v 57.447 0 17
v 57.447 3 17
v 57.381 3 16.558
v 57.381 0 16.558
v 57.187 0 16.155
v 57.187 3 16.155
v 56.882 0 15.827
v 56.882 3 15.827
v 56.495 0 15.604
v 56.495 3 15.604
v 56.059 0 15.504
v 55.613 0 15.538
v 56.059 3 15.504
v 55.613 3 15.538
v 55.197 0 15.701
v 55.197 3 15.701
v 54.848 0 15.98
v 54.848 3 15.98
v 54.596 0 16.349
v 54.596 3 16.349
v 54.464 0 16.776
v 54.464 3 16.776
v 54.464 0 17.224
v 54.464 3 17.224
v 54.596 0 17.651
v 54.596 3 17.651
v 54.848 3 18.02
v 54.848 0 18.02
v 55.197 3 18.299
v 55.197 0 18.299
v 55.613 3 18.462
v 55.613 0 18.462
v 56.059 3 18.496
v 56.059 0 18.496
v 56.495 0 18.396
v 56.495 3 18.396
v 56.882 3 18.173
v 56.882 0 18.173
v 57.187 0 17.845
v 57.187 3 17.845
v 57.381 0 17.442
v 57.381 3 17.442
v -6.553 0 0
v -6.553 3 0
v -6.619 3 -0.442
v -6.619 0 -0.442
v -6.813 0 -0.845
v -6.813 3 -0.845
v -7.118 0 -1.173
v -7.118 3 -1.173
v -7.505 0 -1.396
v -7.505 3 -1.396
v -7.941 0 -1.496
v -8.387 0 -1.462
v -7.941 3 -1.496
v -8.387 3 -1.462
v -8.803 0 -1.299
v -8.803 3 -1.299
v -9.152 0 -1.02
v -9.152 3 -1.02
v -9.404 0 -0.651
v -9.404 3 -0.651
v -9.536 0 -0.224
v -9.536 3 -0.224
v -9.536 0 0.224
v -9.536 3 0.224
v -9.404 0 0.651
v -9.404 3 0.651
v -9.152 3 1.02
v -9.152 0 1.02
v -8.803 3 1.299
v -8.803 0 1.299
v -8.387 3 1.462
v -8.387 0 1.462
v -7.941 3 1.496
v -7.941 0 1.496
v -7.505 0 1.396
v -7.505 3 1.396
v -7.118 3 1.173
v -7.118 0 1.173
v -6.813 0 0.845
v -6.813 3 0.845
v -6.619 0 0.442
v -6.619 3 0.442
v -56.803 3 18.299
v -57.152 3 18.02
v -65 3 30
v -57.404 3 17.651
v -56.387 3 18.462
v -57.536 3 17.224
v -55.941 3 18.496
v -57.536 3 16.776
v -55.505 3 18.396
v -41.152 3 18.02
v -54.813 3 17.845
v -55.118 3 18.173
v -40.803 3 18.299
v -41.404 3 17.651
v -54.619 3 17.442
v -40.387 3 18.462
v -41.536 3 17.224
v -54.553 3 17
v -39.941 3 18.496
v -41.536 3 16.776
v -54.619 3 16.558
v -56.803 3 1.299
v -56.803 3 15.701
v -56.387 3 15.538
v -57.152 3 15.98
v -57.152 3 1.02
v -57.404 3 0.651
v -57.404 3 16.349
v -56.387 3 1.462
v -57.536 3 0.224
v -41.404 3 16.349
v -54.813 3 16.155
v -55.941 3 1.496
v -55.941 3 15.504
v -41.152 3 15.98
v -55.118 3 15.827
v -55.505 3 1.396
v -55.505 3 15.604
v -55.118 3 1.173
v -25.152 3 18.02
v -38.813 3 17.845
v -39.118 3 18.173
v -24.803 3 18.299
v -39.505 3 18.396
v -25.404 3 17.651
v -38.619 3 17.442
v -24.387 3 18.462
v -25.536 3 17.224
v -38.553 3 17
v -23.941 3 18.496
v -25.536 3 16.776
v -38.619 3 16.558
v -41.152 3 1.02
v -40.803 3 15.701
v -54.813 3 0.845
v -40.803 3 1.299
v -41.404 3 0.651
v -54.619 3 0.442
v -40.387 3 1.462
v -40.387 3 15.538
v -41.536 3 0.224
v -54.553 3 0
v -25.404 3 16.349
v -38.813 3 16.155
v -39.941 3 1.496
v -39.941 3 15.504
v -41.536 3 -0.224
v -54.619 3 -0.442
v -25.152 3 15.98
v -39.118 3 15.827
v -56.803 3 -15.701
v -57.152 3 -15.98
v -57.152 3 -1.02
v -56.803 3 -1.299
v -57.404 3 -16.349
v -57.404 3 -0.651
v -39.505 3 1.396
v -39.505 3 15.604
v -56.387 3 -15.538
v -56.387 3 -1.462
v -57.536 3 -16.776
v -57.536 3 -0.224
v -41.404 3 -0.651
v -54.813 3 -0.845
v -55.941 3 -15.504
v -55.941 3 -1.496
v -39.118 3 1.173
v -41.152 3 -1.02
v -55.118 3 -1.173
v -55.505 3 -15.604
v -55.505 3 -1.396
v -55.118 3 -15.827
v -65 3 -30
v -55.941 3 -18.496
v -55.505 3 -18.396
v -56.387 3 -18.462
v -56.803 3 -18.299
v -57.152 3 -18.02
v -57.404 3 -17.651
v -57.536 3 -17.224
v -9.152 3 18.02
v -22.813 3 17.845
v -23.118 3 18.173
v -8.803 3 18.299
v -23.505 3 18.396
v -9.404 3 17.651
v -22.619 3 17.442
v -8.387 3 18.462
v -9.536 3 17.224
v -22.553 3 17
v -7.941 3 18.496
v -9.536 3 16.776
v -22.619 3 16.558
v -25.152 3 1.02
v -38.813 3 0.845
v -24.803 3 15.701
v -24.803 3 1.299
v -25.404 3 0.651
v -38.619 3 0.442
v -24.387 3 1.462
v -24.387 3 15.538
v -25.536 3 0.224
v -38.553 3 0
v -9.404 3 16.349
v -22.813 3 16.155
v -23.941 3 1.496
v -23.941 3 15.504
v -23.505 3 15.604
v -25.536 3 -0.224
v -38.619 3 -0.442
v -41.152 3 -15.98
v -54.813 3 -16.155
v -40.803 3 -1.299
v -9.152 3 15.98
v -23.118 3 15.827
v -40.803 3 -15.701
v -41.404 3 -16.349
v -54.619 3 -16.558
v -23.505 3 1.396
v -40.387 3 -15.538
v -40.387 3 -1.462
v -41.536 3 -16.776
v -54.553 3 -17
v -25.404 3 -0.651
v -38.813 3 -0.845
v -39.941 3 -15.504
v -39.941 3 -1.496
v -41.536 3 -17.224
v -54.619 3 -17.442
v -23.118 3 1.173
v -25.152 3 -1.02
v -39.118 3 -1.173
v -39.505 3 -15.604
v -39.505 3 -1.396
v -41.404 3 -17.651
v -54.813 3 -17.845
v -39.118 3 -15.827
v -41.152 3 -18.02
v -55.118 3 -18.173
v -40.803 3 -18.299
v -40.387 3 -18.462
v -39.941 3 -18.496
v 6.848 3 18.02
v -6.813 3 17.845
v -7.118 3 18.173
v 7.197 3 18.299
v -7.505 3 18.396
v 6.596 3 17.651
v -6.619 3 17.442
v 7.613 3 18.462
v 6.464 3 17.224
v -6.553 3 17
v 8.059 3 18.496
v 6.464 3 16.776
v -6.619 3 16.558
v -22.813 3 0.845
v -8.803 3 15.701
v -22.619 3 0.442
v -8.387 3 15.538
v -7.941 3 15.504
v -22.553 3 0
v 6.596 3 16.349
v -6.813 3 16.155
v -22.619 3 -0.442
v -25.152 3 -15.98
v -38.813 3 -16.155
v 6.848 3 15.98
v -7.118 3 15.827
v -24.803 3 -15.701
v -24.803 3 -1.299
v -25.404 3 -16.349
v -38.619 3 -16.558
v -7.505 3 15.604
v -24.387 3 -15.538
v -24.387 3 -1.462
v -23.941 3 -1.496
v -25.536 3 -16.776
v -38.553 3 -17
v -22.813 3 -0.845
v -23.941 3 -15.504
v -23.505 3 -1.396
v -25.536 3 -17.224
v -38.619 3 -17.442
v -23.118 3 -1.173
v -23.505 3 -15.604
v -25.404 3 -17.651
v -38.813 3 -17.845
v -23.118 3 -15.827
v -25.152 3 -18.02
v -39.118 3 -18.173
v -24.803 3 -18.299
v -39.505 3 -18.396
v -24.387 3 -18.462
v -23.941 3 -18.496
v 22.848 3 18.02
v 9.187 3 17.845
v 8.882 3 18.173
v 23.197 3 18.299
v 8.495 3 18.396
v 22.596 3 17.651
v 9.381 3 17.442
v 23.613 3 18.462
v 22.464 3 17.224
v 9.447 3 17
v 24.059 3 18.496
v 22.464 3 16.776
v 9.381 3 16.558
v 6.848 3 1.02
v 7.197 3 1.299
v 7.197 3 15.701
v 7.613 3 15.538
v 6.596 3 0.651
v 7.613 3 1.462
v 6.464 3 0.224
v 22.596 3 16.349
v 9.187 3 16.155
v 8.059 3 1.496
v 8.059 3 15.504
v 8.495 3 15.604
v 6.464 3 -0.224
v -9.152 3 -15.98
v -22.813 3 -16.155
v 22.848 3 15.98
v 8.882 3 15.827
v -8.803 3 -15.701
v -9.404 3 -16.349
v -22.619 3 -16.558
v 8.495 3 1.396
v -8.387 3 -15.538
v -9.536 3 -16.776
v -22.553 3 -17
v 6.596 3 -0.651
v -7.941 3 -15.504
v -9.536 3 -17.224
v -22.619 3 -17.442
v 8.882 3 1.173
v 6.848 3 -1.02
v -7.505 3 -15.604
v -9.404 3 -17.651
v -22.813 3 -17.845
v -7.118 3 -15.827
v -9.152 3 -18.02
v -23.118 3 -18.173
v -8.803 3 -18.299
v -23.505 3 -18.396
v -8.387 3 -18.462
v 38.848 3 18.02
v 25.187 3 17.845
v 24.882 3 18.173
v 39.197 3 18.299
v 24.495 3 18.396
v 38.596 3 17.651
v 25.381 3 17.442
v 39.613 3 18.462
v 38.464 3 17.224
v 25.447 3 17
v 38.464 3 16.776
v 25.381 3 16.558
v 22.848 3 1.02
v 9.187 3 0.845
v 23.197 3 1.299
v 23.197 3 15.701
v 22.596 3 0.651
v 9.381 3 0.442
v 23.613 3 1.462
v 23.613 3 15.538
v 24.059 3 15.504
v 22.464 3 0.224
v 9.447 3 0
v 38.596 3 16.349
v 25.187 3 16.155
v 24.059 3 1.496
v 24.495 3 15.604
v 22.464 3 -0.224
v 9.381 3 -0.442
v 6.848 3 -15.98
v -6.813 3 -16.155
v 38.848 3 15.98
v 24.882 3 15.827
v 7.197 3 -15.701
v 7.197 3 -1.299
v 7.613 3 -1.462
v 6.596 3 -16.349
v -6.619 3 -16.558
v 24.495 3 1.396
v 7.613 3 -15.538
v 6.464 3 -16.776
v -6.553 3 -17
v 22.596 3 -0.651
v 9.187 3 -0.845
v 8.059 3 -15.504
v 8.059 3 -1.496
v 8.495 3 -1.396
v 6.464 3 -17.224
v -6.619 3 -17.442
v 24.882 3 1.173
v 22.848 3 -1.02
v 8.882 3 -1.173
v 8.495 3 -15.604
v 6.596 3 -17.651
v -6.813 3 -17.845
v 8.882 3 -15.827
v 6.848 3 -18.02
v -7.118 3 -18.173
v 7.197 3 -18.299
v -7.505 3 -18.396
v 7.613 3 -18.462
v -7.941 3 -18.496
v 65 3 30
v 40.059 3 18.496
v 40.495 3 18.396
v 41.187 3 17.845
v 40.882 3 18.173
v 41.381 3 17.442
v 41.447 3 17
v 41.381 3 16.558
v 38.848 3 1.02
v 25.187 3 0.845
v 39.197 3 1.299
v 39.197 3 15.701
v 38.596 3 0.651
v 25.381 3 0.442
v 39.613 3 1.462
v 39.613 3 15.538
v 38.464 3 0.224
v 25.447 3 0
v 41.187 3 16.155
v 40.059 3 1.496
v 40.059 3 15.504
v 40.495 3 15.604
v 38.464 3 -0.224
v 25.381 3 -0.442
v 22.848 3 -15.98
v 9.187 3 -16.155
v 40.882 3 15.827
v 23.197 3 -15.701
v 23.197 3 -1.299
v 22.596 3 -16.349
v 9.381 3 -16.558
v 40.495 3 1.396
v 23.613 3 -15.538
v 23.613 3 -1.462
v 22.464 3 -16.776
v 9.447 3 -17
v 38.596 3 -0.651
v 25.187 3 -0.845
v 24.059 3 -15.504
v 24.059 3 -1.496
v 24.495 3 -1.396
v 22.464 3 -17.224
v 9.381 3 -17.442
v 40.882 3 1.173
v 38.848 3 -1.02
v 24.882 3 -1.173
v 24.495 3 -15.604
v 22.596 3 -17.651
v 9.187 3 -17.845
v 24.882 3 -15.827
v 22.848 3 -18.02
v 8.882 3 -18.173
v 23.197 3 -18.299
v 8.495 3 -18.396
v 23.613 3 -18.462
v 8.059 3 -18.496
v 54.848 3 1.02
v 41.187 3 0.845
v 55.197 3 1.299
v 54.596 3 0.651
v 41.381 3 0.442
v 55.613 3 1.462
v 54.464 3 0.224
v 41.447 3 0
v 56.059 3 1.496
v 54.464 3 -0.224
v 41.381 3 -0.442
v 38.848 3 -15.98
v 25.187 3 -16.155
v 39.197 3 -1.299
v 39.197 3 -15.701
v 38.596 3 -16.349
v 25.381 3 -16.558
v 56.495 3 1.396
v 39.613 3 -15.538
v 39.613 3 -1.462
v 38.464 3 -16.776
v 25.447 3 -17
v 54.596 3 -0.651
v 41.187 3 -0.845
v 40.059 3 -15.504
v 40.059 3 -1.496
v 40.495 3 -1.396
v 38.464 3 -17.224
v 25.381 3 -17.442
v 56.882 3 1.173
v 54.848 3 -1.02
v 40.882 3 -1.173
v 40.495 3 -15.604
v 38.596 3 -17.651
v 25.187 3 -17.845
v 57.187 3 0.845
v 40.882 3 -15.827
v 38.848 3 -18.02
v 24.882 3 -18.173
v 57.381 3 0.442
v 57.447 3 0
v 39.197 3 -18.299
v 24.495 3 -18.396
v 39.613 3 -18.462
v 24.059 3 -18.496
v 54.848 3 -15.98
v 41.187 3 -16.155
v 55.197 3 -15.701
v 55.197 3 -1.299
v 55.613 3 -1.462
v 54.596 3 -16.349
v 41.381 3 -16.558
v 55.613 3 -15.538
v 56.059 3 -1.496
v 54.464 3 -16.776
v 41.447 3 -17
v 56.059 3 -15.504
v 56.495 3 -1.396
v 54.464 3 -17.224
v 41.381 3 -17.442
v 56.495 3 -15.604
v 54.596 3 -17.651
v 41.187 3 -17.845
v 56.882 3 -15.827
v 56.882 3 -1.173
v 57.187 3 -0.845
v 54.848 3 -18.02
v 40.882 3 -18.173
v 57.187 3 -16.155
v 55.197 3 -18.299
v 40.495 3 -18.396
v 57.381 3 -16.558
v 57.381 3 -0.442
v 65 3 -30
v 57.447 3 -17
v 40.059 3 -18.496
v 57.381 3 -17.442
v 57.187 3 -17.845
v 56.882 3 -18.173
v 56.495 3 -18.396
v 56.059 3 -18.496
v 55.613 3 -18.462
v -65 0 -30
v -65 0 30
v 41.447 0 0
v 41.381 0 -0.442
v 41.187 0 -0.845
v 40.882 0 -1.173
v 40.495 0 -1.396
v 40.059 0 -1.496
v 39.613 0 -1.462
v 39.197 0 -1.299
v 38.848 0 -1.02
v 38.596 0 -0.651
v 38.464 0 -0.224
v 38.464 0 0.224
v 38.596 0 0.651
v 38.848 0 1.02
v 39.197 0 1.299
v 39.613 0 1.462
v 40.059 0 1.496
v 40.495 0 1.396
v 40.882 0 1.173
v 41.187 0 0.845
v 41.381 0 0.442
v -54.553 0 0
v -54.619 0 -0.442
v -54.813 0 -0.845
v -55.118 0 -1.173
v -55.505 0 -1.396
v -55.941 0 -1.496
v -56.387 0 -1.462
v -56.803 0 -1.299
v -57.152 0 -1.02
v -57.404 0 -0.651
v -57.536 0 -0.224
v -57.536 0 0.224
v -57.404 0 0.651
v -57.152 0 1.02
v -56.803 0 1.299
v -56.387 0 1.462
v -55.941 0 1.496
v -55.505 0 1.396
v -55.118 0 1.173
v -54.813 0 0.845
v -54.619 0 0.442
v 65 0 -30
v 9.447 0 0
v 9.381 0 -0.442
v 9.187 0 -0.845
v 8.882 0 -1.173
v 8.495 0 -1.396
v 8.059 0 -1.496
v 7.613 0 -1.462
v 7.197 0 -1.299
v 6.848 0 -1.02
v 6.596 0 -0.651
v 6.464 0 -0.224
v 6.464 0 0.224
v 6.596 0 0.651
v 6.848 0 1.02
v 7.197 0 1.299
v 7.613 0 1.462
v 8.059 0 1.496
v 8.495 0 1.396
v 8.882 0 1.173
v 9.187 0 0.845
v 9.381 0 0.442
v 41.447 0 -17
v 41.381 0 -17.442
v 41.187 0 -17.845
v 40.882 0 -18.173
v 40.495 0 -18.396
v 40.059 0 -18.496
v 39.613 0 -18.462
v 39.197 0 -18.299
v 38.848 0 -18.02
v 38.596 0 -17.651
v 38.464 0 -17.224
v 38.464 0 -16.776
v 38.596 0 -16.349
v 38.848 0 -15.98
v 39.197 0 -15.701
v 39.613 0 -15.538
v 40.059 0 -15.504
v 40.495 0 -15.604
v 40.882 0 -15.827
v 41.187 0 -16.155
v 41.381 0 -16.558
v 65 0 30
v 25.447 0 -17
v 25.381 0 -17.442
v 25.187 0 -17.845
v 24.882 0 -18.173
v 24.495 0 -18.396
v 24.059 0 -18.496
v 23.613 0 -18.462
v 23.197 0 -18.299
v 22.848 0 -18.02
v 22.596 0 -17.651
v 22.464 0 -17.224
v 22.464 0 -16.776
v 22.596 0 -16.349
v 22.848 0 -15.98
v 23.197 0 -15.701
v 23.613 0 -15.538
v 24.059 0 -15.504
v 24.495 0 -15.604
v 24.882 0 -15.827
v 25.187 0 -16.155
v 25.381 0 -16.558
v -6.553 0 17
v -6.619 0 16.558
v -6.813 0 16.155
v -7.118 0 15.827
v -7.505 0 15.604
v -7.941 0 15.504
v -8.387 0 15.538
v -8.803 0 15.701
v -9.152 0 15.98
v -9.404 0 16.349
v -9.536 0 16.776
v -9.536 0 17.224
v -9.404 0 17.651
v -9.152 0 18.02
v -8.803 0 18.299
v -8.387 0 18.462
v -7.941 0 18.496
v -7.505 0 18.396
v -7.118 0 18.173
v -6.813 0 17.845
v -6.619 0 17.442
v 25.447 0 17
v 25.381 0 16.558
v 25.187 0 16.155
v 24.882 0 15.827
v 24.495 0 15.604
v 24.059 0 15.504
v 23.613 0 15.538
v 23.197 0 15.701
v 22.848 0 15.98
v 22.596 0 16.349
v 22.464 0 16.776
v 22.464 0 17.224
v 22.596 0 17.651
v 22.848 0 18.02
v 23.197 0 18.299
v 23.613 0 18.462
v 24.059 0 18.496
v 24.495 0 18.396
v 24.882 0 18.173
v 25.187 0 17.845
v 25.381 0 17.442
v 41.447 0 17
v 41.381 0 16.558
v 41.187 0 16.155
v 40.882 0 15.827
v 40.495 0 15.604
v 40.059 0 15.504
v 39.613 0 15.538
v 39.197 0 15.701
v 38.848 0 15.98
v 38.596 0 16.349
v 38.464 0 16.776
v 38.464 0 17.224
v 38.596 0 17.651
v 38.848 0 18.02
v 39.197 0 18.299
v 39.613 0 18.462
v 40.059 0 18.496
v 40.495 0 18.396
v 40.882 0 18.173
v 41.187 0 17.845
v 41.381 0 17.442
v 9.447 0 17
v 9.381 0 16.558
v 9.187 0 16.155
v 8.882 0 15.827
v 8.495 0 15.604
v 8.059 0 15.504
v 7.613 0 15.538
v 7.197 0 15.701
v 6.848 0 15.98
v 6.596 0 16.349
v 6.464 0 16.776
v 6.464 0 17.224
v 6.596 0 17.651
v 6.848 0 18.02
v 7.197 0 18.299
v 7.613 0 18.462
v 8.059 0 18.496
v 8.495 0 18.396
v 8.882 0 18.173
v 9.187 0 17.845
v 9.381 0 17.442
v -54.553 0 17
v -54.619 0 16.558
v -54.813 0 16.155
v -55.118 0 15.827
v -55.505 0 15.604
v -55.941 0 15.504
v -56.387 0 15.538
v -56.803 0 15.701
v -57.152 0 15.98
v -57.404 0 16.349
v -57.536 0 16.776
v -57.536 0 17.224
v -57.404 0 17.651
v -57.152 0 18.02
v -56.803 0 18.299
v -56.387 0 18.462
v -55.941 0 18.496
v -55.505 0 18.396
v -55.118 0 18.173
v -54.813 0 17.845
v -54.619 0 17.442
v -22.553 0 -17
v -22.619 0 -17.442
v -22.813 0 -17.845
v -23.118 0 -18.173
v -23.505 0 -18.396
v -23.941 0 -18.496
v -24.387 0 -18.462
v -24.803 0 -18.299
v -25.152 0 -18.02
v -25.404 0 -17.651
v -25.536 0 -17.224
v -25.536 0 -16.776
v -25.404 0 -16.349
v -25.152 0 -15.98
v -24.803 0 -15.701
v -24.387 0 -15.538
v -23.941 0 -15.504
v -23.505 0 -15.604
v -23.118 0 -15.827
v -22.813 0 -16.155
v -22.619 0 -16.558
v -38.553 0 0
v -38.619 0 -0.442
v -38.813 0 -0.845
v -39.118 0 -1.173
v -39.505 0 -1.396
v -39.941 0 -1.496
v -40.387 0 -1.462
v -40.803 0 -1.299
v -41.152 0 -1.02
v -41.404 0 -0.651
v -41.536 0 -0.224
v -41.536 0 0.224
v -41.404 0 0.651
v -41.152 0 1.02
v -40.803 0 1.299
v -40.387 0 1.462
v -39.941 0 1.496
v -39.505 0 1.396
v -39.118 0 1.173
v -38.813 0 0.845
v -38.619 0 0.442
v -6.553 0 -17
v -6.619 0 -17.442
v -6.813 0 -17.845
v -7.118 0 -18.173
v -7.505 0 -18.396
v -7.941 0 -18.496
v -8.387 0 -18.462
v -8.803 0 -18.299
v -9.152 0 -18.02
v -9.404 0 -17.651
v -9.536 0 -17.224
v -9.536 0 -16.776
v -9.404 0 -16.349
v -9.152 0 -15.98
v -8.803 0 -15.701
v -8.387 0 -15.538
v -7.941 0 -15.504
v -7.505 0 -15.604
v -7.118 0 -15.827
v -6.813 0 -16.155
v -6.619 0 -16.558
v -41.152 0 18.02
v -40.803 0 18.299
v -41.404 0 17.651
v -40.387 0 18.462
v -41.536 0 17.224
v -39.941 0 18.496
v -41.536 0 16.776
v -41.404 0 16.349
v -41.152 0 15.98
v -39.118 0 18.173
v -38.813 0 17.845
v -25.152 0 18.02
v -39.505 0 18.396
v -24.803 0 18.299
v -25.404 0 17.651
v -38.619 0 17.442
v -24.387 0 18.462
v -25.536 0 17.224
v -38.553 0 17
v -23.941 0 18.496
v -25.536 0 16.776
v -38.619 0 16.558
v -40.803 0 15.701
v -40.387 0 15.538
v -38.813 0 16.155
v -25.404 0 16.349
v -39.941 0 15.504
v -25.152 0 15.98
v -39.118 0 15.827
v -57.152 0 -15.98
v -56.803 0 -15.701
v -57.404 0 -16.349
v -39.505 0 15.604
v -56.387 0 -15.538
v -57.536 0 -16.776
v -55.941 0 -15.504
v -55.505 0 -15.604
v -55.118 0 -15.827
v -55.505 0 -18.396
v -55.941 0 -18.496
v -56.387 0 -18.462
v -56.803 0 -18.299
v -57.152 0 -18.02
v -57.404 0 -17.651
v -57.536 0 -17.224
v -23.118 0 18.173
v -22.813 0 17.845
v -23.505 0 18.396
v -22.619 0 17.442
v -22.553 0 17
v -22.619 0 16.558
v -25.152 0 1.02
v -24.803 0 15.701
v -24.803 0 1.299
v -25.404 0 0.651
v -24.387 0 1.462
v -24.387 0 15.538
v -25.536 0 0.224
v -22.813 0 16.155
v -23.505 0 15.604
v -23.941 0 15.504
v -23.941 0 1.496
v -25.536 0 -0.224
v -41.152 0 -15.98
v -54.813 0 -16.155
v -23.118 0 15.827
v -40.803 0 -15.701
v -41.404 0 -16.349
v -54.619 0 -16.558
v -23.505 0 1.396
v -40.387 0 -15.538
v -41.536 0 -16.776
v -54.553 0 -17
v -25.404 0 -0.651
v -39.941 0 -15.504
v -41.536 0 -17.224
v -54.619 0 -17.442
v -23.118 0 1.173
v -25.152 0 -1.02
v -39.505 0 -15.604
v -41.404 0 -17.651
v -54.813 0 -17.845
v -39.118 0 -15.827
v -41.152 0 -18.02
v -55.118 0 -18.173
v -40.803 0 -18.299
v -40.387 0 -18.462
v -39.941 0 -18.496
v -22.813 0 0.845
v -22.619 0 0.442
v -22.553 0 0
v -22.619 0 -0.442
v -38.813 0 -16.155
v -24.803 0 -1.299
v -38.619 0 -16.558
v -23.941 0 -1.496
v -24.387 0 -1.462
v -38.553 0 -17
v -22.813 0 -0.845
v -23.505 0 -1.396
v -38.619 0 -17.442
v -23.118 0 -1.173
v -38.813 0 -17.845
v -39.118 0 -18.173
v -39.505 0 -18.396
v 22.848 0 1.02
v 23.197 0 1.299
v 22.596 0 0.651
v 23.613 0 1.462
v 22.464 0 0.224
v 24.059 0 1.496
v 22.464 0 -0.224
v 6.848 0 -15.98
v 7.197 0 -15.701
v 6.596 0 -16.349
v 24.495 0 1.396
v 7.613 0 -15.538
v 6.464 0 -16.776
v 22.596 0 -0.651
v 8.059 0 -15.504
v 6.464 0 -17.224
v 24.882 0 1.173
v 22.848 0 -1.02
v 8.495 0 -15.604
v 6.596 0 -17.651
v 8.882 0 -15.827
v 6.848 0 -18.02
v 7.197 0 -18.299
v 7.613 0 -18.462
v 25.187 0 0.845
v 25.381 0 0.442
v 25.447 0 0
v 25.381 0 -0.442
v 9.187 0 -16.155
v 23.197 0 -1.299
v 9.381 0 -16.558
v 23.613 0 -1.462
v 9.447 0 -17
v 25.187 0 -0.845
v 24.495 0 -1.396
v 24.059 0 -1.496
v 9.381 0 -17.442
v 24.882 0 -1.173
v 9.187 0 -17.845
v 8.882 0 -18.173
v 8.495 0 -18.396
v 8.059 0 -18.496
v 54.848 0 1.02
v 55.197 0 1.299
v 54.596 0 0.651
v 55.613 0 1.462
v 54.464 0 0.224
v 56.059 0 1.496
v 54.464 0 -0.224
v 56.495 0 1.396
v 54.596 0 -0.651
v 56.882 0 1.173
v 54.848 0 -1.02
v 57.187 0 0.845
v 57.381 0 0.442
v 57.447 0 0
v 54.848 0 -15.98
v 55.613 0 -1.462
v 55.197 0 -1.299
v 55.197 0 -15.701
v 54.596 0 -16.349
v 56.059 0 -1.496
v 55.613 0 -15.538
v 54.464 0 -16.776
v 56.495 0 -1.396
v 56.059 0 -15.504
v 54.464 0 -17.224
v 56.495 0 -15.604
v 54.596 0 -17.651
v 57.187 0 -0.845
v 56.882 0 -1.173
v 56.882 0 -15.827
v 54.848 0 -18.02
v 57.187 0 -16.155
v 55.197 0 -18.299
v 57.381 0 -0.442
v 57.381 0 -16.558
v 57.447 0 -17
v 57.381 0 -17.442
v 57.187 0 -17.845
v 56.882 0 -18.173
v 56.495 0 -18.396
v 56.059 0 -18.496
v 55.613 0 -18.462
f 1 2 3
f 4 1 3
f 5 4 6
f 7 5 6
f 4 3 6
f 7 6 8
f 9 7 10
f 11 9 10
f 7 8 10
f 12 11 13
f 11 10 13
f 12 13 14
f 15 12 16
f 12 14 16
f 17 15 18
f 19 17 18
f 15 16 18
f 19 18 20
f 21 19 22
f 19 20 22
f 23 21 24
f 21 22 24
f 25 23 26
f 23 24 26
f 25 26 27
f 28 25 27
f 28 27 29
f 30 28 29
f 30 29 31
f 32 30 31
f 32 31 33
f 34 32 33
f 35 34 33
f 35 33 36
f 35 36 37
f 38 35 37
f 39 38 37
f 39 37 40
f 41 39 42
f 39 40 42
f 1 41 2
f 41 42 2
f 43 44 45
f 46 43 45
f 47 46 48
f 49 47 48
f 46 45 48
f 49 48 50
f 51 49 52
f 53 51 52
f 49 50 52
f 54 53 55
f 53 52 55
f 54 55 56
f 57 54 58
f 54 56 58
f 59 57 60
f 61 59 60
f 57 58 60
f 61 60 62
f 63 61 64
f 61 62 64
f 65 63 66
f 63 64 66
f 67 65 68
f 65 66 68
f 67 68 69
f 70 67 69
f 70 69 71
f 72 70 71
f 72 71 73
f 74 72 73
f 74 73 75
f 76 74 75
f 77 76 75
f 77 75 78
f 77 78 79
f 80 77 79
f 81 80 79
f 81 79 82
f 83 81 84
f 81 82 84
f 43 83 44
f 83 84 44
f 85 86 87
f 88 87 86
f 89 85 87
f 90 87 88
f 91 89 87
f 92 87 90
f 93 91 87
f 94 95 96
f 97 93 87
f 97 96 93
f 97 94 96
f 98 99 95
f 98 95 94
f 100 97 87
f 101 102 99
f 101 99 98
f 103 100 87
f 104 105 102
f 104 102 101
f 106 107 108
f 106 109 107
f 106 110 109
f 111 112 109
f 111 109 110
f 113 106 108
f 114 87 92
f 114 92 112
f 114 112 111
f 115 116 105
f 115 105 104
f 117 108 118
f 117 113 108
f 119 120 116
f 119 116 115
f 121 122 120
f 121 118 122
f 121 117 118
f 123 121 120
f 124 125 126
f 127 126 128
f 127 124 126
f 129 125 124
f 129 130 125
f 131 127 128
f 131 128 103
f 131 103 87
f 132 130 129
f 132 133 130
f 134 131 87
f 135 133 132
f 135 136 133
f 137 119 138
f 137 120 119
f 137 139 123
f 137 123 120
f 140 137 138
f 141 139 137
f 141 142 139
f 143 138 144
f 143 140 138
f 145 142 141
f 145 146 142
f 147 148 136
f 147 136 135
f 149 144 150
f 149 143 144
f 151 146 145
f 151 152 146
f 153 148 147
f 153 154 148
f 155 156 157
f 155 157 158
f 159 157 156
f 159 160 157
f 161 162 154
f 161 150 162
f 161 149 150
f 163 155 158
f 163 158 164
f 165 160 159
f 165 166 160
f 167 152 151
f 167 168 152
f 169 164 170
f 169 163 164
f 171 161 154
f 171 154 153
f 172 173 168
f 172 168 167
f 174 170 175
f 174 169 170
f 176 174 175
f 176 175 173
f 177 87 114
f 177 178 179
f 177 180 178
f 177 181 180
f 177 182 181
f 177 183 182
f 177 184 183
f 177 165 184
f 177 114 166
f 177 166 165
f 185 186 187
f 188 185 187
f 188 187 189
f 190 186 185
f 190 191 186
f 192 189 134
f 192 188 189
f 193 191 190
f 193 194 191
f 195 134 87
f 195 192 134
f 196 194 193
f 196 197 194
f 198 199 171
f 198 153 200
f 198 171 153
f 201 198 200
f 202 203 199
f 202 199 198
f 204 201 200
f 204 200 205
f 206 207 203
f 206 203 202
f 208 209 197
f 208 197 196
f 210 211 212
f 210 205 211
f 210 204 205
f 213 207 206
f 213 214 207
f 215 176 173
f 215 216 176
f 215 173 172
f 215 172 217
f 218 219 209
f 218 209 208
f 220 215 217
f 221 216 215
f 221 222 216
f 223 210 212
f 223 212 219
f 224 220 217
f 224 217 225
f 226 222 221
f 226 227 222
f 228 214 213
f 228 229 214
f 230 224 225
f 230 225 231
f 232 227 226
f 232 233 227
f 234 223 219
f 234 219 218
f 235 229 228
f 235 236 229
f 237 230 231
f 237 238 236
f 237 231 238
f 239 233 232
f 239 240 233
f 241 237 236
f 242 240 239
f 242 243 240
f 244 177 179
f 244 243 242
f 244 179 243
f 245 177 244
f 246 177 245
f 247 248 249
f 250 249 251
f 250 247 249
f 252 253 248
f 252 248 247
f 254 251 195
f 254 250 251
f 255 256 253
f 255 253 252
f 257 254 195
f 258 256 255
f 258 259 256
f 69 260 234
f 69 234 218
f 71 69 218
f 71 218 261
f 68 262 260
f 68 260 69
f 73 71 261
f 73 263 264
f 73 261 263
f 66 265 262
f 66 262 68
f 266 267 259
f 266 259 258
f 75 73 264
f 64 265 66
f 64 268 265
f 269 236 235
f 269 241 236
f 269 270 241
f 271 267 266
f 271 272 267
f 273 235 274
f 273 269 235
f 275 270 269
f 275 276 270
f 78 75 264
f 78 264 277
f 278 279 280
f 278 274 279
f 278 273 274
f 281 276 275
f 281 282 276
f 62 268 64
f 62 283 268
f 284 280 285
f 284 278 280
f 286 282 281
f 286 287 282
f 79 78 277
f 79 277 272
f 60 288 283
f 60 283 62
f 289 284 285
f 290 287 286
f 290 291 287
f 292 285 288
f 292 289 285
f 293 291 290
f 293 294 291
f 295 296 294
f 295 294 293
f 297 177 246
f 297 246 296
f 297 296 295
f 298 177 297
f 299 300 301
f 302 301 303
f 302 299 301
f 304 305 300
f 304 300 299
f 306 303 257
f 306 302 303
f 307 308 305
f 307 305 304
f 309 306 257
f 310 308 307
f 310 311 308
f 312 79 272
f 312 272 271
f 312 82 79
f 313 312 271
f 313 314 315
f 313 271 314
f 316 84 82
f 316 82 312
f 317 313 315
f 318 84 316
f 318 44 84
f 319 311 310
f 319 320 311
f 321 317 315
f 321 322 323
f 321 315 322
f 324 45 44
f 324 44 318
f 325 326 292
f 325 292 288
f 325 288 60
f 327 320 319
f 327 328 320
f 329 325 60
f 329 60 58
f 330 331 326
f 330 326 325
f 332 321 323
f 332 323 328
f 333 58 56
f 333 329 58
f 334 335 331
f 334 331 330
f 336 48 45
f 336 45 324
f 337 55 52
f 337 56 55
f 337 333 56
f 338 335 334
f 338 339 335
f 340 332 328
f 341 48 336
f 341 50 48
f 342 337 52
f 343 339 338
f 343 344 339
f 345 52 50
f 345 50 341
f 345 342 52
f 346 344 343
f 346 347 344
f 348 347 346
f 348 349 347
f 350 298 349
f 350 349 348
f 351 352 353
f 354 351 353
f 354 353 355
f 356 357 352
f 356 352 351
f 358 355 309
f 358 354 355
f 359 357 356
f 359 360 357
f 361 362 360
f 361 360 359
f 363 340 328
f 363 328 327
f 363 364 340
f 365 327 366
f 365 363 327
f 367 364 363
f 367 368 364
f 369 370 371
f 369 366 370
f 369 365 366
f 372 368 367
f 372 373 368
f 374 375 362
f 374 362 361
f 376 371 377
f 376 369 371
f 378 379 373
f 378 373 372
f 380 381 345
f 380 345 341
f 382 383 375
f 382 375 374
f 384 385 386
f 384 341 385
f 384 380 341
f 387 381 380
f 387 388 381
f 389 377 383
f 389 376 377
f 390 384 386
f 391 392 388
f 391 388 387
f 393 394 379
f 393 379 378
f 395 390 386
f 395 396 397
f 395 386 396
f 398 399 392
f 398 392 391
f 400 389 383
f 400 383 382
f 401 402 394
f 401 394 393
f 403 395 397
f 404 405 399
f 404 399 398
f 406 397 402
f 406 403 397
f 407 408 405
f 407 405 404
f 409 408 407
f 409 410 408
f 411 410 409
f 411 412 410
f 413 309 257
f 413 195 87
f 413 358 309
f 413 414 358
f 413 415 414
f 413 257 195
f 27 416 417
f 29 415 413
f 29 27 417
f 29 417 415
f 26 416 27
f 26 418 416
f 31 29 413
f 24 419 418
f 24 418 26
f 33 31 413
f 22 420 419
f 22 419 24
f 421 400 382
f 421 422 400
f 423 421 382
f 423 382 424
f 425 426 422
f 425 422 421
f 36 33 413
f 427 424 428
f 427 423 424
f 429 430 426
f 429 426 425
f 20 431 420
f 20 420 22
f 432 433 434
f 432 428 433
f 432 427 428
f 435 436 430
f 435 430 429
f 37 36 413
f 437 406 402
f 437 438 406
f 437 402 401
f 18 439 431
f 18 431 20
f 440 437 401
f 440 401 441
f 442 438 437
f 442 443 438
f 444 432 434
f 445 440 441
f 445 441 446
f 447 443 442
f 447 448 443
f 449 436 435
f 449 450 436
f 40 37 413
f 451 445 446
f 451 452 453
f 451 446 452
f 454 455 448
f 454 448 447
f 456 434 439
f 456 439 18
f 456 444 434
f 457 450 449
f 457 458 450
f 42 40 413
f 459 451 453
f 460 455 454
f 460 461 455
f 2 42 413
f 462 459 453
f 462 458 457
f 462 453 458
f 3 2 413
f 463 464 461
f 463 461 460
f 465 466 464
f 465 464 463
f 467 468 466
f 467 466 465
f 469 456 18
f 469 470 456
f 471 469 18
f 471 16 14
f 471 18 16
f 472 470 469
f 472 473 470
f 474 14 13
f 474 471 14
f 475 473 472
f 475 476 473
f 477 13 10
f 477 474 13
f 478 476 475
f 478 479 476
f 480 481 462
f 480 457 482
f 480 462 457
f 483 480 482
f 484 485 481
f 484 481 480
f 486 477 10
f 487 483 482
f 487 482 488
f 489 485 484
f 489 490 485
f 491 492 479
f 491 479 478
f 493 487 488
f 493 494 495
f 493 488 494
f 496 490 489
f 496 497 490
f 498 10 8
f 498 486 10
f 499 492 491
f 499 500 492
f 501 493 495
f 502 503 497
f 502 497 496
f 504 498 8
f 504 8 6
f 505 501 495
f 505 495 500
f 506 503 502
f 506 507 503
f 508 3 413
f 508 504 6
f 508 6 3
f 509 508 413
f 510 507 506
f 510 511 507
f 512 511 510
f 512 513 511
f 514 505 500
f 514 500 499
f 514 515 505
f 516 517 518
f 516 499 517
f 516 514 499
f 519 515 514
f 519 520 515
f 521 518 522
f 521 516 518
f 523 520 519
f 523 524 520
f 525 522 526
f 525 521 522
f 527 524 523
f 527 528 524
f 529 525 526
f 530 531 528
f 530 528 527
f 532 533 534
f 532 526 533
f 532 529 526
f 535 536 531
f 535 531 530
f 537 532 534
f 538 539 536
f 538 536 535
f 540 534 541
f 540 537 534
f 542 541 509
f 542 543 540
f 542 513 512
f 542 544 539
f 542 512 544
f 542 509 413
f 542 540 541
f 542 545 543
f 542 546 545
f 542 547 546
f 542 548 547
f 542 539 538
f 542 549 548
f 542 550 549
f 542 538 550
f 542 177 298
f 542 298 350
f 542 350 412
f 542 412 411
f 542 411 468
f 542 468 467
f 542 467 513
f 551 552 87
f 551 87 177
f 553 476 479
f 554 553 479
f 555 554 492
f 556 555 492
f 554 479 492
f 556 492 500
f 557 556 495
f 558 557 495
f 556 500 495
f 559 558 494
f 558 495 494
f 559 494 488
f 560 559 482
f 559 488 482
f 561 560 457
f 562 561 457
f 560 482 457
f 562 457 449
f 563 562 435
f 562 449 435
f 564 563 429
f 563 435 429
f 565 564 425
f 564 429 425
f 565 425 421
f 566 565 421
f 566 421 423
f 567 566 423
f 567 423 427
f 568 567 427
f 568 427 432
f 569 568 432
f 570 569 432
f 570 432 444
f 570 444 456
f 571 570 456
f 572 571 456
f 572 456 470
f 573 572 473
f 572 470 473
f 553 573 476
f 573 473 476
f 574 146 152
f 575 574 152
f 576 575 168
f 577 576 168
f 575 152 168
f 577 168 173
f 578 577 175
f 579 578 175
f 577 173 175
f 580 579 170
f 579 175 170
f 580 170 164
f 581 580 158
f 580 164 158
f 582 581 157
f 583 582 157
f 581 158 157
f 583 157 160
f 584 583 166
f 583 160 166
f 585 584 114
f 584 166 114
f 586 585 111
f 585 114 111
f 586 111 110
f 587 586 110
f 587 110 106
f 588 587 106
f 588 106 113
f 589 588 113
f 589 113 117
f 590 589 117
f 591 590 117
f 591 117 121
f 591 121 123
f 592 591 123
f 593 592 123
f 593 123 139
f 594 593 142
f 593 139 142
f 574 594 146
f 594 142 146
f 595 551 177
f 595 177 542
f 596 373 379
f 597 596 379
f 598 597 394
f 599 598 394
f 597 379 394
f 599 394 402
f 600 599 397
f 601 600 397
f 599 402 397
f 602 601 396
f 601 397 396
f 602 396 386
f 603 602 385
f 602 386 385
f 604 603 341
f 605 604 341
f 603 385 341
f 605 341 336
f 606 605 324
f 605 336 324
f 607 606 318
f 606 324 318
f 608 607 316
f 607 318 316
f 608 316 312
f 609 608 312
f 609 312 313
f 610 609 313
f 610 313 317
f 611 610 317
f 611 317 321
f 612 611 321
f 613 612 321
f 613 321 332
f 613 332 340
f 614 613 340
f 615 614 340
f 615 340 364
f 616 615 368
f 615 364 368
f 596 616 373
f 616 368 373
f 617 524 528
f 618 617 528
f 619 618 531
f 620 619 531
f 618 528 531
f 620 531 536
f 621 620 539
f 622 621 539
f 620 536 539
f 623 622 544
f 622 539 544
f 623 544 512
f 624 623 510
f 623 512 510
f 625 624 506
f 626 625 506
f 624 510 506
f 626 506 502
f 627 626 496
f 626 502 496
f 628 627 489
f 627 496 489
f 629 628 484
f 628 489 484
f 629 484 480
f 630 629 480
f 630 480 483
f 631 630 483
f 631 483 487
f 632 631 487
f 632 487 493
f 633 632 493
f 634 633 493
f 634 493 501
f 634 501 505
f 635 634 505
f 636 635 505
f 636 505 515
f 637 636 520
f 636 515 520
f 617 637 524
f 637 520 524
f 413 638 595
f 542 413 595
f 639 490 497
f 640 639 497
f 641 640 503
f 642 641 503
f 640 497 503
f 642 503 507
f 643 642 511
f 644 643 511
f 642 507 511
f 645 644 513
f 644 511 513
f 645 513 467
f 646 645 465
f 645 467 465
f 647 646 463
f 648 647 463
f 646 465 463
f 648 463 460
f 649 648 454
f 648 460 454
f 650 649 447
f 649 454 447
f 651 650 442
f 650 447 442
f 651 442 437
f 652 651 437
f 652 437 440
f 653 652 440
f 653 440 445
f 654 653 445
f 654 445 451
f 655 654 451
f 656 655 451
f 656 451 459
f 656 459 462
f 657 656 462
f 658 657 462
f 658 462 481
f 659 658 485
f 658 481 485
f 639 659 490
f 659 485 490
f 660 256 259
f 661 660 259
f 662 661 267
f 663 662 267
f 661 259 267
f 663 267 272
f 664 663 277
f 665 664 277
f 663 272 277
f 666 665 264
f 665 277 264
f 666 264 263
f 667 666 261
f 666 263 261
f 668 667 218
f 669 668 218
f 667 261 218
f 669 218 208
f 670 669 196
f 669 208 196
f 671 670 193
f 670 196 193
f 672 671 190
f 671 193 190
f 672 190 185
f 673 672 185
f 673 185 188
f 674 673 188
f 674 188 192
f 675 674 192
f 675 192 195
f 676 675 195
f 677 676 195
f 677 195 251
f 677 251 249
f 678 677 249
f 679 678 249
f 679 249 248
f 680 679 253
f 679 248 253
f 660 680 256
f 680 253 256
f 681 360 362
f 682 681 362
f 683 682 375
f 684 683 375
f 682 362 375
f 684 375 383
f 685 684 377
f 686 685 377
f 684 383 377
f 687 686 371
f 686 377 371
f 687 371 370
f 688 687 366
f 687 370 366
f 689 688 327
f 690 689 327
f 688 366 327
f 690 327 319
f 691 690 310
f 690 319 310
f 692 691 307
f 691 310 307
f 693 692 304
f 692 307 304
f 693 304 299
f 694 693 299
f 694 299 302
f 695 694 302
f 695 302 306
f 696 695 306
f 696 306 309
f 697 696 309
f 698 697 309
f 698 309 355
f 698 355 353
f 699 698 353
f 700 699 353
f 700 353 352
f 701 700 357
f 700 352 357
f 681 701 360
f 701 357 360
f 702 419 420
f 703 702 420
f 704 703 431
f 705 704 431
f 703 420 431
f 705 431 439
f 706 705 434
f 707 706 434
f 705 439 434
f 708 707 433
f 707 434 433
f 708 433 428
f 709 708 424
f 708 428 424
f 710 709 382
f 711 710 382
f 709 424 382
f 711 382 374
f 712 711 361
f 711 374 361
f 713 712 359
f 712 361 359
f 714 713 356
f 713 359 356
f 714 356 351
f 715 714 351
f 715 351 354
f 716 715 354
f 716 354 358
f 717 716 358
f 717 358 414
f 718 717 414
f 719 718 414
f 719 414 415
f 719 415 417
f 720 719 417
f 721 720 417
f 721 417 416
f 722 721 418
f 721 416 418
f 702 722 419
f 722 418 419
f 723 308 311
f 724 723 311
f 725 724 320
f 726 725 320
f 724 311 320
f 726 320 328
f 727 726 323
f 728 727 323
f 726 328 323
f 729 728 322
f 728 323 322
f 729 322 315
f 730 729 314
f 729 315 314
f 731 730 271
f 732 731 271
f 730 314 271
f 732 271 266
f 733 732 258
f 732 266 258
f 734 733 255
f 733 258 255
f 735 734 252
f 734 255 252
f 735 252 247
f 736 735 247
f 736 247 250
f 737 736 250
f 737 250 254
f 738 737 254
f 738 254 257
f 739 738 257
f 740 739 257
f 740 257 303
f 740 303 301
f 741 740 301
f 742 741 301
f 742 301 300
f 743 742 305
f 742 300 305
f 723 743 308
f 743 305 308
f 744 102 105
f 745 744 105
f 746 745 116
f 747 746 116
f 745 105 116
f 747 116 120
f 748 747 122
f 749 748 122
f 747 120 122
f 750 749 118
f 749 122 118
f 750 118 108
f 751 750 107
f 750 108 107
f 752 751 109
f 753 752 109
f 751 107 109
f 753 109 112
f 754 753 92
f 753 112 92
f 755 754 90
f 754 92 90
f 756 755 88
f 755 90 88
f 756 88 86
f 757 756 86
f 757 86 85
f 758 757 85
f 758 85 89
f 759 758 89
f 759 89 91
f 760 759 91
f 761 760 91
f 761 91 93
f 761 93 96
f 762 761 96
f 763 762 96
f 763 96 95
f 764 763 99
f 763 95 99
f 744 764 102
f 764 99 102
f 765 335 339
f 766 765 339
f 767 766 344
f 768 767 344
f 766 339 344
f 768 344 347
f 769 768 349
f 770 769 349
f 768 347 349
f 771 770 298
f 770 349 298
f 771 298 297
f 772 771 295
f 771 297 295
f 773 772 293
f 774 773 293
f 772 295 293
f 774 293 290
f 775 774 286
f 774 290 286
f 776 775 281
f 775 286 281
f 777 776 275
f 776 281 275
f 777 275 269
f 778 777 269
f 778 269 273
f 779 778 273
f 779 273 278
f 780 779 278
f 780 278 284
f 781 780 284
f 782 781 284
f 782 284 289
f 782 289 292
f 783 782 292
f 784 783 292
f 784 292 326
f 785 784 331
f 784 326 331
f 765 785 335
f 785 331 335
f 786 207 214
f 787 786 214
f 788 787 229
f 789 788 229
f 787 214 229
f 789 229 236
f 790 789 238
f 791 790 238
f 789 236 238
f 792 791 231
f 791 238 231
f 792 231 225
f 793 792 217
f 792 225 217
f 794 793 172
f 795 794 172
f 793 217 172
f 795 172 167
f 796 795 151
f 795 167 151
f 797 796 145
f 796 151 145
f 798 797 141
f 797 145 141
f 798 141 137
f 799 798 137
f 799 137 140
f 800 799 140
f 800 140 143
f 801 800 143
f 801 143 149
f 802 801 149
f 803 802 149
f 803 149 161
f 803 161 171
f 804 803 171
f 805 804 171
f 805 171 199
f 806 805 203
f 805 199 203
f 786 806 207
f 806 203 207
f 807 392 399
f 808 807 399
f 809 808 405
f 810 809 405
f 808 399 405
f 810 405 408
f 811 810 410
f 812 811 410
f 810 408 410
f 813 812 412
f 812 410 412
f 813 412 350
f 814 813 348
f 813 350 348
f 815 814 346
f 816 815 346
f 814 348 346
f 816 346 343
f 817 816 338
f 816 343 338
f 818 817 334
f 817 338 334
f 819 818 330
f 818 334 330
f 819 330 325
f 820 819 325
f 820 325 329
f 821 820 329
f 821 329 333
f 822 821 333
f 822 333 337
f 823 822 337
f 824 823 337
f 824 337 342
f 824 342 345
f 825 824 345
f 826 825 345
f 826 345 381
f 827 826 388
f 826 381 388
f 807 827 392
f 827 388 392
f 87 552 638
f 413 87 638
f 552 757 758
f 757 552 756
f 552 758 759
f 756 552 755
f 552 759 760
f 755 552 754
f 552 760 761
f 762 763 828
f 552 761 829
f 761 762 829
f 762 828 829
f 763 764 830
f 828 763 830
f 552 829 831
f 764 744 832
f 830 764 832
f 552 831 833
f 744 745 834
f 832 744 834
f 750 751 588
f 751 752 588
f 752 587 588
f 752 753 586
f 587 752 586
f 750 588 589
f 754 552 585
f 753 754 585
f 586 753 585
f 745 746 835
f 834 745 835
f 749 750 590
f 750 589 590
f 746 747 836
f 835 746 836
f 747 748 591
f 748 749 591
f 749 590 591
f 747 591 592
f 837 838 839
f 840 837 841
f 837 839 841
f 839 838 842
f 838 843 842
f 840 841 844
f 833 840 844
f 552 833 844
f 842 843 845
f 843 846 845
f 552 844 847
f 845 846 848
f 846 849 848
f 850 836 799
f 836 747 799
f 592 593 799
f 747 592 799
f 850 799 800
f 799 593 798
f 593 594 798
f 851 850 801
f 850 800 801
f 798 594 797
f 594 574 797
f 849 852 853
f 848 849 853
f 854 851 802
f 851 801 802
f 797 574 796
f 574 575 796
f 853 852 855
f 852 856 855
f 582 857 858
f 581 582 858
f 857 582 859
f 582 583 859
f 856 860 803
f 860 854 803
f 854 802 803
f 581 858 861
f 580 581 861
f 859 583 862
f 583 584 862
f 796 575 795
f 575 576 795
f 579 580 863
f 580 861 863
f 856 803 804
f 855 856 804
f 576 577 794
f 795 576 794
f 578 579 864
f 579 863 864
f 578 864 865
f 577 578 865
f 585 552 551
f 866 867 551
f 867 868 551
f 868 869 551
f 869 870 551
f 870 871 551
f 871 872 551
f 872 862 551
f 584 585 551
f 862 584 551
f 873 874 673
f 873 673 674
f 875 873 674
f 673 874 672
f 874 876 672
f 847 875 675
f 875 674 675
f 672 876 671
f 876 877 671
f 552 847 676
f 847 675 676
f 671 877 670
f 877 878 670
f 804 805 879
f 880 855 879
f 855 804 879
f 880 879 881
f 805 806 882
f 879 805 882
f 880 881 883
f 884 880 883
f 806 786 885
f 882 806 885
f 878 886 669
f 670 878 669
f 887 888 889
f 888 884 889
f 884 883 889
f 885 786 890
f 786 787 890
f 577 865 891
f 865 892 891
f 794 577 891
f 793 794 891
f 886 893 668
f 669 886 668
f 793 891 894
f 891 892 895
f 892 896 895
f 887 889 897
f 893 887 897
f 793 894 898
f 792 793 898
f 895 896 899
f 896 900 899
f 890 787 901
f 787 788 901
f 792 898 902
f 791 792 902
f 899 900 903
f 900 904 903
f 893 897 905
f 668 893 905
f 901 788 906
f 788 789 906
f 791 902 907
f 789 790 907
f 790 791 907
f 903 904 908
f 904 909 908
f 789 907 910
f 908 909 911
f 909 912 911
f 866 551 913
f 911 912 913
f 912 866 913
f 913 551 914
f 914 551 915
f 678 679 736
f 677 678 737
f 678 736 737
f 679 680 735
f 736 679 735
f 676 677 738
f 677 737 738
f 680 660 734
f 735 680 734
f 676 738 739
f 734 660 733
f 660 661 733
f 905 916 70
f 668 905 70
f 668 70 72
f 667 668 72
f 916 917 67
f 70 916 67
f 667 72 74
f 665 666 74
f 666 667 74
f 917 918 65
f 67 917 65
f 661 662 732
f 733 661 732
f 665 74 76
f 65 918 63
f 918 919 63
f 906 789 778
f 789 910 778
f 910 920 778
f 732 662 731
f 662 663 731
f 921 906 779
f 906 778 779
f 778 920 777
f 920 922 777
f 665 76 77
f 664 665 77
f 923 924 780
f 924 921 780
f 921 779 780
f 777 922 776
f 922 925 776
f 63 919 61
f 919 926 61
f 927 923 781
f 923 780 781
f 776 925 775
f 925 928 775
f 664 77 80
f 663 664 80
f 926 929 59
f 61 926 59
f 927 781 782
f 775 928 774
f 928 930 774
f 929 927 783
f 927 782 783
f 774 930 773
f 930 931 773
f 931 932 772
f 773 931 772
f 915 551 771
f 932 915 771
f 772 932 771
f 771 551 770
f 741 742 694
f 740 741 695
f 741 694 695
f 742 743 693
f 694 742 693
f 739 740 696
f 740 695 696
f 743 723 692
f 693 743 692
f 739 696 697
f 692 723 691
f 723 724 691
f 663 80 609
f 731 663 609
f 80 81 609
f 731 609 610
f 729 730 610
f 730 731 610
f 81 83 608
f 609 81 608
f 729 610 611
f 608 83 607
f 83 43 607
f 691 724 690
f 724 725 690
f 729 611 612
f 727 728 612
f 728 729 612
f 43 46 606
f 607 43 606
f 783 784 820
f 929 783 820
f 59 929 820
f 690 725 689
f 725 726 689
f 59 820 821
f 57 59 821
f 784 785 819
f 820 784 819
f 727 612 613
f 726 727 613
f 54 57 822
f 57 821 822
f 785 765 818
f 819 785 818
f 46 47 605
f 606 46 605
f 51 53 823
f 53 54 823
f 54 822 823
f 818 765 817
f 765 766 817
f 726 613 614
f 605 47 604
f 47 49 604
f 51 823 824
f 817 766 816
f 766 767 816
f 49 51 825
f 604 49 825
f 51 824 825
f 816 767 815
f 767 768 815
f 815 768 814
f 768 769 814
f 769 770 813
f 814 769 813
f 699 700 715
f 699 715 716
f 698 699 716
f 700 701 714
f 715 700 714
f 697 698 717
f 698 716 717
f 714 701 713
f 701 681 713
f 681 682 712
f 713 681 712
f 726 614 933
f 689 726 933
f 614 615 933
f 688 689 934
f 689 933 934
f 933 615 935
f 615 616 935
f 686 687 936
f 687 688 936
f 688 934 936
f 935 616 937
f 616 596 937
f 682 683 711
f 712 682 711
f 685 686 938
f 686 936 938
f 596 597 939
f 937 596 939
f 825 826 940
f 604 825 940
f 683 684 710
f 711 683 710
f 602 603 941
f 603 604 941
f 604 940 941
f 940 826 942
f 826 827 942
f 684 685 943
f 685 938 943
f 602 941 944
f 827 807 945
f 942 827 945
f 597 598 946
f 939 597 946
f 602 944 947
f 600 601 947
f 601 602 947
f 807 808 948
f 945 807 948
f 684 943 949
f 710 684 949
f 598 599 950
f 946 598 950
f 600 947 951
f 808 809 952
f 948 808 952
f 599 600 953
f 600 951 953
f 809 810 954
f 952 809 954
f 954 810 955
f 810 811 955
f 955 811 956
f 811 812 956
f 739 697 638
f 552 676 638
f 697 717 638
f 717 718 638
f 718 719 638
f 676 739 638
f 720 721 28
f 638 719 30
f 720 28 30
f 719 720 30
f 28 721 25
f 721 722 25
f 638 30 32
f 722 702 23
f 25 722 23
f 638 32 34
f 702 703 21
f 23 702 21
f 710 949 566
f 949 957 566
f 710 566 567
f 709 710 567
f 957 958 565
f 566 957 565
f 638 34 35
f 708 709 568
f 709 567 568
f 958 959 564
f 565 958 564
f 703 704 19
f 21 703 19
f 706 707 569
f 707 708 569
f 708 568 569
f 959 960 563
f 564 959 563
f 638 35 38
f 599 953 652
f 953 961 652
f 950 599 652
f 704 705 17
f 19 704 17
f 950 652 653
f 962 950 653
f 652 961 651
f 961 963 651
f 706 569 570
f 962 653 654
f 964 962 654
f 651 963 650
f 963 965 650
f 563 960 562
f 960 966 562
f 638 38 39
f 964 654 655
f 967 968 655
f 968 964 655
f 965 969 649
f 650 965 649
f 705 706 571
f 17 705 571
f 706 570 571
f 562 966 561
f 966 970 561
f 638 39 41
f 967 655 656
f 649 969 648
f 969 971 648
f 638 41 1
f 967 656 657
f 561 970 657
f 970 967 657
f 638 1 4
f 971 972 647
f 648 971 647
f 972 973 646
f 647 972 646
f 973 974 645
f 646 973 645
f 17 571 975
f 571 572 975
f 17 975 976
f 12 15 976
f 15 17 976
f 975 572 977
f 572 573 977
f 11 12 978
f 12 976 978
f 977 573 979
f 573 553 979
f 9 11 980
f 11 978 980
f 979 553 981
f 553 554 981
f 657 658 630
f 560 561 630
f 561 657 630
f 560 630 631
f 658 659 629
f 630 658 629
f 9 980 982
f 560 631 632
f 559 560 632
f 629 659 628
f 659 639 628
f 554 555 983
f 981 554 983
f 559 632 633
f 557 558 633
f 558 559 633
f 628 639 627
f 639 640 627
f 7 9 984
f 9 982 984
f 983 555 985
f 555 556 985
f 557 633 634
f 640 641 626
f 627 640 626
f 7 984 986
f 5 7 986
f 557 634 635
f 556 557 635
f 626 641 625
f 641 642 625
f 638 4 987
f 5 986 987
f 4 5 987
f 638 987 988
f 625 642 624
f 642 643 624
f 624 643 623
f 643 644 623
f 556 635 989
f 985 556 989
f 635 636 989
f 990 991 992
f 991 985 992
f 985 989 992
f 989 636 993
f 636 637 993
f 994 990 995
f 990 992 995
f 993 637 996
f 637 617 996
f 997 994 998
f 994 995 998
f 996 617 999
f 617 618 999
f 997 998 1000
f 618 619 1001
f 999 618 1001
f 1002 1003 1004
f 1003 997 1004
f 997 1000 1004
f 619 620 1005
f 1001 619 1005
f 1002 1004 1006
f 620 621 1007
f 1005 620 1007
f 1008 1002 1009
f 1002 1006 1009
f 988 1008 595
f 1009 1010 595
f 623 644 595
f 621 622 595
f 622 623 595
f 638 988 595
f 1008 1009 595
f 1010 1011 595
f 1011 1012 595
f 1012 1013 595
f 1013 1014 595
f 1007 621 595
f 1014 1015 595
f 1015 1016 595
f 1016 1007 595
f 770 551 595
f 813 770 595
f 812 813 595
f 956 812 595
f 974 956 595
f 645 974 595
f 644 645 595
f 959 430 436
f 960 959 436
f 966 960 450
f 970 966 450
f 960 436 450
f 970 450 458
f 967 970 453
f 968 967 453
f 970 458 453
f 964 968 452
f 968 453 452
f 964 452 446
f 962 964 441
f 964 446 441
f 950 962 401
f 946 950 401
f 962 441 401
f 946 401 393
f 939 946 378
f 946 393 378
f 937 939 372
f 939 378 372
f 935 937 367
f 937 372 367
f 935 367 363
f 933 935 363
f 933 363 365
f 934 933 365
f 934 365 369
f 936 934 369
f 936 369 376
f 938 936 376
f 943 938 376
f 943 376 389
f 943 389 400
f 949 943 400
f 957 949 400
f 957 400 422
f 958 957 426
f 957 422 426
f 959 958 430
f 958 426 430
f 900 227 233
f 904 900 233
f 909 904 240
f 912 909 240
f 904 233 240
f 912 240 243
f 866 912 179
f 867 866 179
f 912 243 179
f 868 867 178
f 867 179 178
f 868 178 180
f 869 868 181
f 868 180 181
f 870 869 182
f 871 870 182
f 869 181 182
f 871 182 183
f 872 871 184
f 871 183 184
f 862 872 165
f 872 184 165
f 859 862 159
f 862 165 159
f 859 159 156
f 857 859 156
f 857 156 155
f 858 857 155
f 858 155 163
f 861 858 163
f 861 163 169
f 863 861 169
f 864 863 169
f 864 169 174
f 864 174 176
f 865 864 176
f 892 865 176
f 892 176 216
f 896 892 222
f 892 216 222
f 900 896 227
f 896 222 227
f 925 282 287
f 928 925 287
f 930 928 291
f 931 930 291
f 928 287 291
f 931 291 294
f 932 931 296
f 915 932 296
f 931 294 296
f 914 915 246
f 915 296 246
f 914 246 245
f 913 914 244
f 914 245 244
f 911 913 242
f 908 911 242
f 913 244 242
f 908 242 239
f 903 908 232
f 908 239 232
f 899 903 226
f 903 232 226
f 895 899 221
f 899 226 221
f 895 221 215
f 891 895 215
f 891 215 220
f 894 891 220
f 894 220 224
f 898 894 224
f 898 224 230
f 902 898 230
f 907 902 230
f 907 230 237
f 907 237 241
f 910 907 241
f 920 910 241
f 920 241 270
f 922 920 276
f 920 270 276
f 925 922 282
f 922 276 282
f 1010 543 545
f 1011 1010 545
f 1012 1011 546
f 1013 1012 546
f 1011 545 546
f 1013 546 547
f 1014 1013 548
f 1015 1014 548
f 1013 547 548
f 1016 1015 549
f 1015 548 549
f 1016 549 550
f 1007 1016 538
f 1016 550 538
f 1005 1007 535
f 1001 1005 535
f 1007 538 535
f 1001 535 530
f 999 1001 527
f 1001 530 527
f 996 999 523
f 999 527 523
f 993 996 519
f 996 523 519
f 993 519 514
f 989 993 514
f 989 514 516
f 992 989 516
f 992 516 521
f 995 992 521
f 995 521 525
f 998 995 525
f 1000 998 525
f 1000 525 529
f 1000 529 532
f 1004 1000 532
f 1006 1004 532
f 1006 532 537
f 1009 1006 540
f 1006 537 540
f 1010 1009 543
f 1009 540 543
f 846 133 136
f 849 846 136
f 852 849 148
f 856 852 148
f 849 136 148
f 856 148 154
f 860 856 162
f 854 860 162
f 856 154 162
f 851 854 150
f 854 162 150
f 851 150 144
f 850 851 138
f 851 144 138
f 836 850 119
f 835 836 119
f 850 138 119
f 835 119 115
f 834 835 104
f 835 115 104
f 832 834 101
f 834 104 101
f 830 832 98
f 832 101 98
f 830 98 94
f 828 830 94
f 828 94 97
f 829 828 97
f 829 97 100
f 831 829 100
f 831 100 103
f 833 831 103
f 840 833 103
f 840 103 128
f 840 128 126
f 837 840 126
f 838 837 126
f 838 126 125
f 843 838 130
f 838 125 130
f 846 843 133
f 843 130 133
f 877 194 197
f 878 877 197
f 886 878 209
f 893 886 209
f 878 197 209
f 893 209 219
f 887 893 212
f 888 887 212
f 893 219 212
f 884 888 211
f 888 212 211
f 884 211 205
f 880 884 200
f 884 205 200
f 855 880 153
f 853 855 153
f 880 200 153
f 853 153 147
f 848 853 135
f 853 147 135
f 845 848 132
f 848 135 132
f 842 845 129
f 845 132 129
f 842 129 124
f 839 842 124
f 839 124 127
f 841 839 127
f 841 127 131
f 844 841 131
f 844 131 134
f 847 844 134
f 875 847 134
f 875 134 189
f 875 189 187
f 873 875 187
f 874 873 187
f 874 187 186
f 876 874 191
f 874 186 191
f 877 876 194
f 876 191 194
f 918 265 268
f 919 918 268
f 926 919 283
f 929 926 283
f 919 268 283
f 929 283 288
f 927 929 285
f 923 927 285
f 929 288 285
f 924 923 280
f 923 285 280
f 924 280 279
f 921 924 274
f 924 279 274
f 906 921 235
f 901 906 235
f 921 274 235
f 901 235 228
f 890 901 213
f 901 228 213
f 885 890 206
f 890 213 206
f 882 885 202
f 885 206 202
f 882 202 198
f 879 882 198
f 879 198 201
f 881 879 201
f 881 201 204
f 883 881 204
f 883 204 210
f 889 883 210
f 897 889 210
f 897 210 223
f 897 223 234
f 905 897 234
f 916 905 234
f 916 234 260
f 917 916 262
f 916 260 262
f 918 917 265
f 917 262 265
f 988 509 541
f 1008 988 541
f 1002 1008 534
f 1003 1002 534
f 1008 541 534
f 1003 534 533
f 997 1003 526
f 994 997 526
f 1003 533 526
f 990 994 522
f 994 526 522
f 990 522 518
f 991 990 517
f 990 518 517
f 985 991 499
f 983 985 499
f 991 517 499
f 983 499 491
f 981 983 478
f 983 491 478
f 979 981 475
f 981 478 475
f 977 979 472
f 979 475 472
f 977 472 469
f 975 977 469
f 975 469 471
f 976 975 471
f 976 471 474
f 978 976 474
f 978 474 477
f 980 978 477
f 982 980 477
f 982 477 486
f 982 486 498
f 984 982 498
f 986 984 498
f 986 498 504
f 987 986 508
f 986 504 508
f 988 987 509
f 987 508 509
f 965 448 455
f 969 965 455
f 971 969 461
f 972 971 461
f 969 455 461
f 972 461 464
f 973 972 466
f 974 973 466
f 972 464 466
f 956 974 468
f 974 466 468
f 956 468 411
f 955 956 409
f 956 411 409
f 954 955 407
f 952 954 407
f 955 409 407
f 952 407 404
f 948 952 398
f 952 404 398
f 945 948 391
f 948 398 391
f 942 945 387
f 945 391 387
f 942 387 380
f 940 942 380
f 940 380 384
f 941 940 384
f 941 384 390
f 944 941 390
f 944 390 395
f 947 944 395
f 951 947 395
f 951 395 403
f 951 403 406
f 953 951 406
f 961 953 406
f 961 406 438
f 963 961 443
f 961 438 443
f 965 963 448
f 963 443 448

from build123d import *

# Parameters (mm, degrees)
SKETCH_1_W          = 130
SKETCH_1_H          = 60
EXTRUDE_1_DEPTH     = 3
SKETCH_2_R          = 1.5
CUT_EXTRUDE_1_DEPTH = 3


with BuildPart() as part:
    # Эскиз1 → Бобышка-Вытянуть1 (new body)
    with BuildSketch(Plane(origin=(0, 0, 0), x_dir=(1, 0, 0), z_dir=(0, 1, 0))):
        Rectangle(SKETCH_1_W, SKETCH_1_H)
    extrude(amount=EXTRUDE_1_DEPTH)

    # Эскиз2 → Вырез-Вытянуть1 (cut)
    with BuildSketch(Plane(origin=(0, 3, 0), x_dir=(1, 0, 0), z_dir=(0, 1, 0))):
        with Locations((-56.052735869, 17)):
            Circle(SKETCH_2_R)
        with Locations((-40.052735869, 17)):
            Circle(SKETCH_2_R)
        with Locations((-24.052735869, 17)):
            Circle(SKETCH_2_R)
        with Locations((-8.052735869, 17)):
            Circle(SKETCH_2_R)
        with Locations((7.947264131, 17)):
            Circle(SKETCH_2_R)
        with Locations((23.947264131, 17)):
            Circle(SKETCH_2_R)
        with Locations((39.947264131, 17)):
            Circle(SKETCH_2_R)
        with Locations((55.947264131, 17)):
            Circle(SKETCH_2_R)
        with Locations((-56.052735869, 0)):
            Circle(SKETCH_2_R)
        with Locations((-56.052735869, -17)):
            Circle(SKETCH_2_R)
        with Locations((-40.052735869, 0)):
            Circle(SKETCH_2_R)
        with Locations((-40.052735869, -17)):
            Circle(SKETCH_2_R)
        with Locations((-24.052735869, 0)):
            Circle(SKETCH_2_R)
        with Locations((-24.052735869, -17)):
            Circle(SKETCH_2_R)
        with Locations((-8.052735869, 0)):
            Circle(SKETCH_2_R)
        with Locations((-8.052735869, -17)):
            Circle(SKETCH_2_R)
        with Locations((7.947264131, 0)):
            Circle(SKETCH_2_R)
        with Locations((7.947264131, -17)):
            Circle(SKETCH_2_R)
        with Locations((23.947264131, 0)):
            Circle(SKETCH_2_R)
        with Locations((23.947264131, -17)):
            Circle(SKETCH_2_R)
        with Locations((39.947264131, 0)):
            Circle(SKETCH_2_R)
        with Locations((39.947264131, -17)):
            Circle(SKETCH_2_R)
        with Locations((55.947264131, 0)):
            Circle(SKETCH_2_R)
        with Locations((55.947264131, -17)):
            Circle(SKETCH_2_R)
    extrude(amount=-CUT_EXTRUDE_1_DEPTH, mode=Mode.SUBTRACT)


solid = part.part
